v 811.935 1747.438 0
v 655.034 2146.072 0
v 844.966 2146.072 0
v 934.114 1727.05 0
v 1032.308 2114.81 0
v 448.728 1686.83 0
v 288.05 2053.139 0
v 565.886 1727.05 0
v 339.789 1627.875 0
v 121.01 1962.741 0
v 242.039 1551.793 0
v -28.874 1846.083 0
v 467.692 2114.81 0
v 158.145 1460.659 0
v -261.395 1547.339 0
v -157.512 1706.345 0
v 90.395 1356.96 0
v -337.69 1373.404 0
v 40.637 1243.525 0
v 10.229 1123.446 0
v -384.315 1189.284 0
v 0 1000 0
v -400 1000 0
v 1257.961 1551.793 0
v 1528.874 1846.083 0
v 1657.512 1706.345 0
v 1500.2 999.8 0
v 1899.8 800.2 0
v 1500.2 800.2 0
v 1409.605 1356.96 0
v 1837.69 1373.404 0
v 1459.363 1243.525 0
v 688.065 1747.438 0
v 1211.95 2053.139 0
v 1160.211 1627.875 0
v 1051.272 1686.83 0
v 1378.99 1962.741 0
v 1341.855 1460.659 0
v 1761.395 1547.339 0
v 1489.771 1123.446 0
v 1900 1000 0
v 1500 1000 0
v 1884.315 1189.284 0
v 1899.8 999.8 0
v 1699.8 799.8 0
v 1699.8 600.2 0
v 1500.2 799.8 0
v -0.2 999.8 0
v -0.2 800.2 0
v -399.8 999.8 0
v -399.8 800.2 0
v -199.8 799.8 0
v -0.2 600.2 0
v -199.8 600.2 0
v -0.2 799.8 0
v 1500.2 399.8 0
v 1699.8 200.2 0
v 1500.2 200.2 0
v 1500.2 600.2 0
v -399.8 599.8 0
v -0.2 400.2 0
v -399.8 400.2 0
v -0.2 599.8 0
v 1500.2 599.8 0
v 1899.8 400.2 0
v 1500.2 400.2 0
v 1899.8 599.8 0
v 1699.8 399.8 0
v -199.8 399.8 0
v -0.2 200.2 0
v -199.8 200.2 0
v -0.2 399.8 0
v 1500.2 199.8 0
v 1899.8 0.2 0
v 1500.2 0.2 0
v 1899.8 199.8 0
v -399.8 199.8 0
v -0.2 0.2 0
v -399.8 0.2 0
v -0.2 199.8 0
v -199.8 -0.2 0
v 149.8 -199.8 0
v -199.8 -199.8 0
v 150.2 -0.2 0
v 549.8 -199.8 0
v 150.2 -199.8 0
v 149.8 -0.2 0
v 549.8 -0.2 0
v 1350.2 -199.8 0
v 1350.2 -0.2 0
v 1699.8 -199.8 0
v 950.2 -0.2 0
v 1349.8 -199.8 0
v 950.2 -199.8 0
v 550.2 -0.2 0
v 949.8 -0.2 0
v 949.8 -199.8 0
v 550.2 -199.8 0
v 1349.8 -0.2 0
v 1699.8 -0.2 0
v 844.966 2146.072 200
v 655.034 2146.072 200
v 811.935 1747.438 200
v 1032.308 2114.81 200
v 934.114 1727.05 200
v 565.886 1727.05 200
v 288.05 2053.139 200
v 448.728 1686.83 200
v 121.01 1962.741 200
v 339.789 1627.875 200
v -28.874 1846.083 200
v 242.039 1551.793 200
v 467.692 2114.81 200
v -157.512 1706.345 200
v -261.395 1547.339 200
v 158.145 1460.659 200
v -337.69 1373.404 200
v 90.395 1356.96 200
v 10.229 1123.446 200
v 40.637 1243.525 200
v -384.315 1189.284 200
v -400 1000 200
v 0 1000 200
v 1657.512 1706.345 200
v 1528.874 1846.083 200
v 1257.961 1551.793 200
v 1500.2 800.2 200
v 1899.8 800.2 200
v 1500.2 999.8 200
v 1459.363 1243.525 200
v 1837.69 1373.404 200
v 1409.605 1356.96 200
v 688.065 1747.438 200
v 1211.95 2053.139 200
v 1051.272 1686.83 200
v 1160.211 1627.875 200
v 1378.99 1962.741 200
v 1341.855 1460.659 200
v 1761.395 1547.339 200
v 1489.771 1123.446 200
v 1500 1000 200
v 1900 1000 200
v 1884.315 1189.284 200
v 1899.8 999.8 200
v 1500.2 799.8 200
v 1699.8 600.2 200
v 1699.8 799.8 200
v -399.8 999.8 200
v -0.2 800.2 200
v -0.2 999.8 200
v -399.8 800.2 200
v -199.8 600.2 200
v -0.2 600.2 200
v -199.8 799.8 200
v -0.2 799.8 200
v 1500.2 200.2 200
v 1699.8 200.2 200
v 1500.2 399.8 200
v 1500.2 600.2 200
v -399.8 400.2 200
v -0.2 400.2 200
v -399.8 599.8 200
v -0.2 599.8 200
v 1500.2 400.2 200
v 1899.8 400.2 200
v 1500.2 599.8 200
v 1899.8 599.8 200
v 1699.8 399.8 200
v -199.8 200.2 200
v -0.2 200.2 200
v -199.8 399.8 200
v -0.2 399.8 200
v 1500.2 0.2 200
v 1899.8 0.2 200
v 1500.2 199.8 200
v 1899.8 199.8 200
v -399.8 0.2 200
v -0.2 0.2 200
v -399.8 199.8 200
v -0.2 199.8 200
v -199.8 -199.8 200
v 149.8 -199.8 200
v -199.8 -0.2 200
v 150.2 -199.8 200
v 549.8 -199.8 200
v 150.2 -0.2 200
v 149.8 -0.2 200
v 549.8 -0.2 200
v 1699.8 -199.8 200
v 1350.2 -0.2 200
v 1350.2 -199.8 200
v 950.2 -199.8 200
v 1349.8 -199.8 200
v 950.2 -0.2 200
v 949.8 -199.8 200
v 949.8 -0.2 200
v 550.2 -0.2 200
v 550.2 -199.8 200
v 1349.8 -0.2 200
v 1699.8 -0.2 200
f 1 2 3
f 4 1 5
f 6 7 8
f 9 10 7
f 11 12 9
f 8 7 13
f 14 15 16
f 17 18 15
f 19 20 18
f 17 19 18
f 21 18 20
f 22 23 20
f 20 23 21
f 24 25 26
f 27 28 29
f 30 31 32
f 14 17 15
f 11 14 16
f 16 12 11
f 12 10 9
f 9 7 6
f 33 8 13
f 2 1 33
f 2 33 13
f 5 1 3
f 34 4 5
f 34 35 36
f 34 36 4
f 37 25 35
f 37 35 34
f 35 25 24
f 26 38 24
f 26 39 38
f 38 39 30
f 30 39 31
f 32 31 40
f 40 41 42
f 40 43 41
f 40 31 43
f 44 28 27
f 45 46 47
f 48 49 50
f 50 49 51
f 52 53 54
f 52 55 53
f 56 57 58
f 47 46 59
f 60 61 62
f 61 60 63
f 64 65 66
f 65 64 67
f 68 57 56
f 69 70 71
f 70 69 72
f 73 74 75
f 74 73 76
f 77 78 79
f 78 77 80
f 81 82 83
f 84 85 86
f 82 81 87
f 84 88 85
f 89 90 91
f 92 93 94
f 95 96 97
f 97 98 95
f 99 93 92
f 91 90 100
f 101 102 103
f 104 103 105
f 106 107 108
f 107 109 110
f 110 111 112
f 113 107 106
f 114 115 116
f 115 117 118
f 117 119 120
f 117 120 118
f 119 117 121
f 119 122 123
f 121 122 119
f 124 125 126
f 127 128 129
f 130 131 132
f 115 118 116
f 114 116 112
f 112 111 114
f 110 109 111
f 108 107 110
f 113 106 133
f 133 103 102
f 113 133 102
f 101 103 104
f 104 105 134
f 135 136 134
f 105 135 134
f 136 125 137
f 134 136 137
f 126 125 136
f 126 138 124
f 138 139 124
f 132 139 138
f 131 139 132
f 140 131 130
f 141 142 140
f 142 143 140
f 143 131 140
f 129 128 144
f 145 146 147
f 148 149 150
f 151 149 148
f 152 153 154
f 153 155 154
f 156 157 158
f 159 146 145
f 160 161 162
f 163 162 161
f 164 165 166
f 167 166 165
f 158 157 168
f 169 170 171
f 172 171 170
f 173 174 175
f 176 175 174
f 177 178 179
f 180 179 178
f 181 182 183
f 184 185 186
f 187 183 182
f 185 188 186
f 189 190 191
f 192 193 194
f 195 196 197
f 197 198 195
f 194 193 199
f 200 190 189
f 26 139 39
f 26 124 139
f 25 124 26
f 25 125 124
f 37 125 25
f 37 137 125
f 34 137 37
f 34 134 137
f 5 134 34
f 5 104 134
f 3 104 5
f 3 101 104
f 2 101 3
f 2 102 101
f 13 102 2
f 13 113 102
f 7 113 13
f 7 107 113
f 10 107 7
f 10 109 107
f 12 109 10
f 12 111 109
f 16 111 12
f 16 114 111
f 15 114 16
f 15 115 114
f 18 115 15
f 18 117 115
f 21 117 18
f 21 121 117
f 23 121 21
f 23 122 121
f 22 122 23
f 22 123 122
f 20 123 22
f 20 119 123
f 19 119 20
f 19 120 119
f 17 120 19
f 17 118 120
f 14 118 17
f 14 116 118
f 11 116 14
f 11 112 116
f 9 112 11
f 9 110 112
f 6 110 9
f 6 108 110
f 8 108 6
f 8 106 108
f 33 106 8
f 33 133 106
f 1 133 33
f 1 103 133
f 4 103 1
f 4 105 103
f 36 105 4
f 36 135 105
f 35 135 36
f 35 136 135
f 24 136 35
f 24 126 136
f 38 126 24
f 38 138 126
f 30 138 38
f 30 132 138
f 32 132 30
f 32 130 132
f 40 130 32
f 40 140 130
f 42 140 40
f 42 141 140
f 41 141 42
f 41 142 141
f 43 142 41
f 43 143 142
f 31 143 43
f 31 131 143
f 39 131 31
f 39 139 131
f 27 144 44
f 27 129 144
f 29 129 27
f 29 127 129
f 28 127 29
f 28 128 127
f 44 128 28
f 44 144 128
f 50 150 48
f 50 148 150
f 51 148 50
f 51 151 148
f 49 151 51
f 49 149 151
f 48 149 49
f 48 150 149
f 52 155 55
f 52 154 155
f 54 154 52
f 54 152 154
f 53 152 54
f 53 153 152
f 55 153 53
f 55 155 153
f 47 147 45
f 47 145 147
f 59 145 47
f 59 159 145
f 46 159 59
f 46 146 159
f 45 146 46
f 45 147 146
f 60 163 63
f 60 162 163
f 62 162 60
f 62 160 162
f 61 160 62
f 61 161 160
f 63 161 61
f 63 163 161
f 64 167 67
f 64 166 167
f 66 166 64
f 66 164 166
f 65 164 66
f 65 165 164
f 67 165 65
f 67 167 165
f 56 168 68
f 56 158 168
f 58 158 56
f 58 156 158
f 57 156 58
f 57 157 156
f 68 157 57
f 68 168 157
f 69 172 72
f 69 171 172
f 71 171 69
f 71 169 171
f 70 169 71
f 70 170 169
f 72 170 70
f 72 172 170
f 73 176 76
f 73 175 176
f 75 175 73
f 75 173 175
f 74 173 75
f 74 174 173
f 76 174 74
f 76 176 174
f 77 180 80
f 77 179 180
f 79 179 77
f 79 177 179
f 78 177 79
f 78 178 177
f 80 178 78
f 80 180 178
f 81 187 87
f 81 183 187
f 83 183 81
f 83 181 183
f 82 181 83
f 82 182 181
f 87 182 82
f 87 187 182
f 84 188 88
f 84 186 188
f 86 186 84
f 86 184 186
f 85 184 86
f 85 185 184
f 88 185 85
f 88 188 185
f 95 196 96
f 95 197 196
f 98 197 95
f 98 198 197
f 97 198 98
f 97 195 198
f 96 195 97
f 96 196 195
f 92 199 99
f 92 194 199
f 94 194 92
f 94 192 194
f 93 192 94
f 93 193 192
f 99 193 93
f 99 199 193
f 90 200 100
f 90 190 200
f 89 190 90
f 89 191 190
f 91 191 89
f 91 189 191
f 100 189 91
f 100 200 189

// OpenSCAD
// Generated by Parametrix
ca_door1arc_faceDoor_000 = [ [ 1500.0000, 1000.0000 ],[ 1900.0000, 1000.0000 ],[ 1884.3155, 1189.2838 ],[ 1489.7710, 1123.4459 ],[ 1500.0000, 1000.0000 ] ];
cb_door1arc_faceDoor_000 = [  0, 1, 2, 3, 4 ];
ca_door1arc_faceDoor_001 = [ [ 1489.7710, 1123.4459 ],[ 1884.3155, 1189.2838 ],[ 1837.6898, 1373.4044 ],[ 1459.3629, 1243.5246 ],[ 1489.7710, 1123.4459 ] ];
cb_door1arc_faceDoor_001 = [  5, 6, 7, 8, 9 ];
ca_door1arc_faceDoor_002 = [ [ 1459.3629, 1243.5246 ],[ 1837.6898, 1373.4044 ],[ 1761.3948, 1547.3395 ],[ 1409.6053, 1356.9605 ],[ 1459.3629, 1243.5246 ] ];
cb_door1arc_faceDoor_002 = [  10, 11, 12, 13, 14 ];
ca_door1arc_faceDoor_003 = [ [ 1409.6053, 1356.9605 ],[ 1761.3948, 1547.3395 ],[ 1657.5116, 1706.3446 ],[ 1341.8554, 1460.6595 ],[ 1409.6053, 1356.9605 ] ];
cb_door1arc_faceDoor_003 = [  15, 16, 17, 18, 19 ];
ca_door1arc_faceDoor_004 = [ [ 1341.8554, 1460.6595 ],[ 1657.5116, 1706.3446 ],[ 1528.8738, 1846.0825 ],[ 1257.9612, 1551.7929 ],[ 1341.8554, 1460.6595 ] ];
cb_door1arc_faceDoor_004 = [  20, 21, 22, 23, 24 ];
ca_door1arc_faceDoor_005 = [ [ 1257.9612, 1551.7929 ],[ 1528.8738, 1846.0825 ],[ 1378.9904, 1962.7415 ],[ 1160.2111, 1627.8749 ],[ 1257.9612, 1551.7929 ] ];
cb_door1arc_faceDoor_005 = [  25, 26, 27, 28, 29 ];
ca_door1arc_faceDoor_006 = [ [ 1160.2111, 1627.8749 ],[ 1378.9904, 1962.7415 ],[ 1211.9497, 2053.1393 ],[ 1051.2716, 1686.8300 ],[ 1160.2111, 1627.8749 ] ];
cb_door1arc_faceDoor_006 = [  30, 31, 32, 33, 34 ];
ca_door1arc_faceDoor_007 = [ [ 1051.2716, 1686.8300 ],[ 1211.9497, 2053.1393 ],[ 1032.3083, 2114.8103 ],[ 934.1141, 1727.0502 ],[ 1051.2716, 1686.8300 ] ];
cb_door1arc_faceDoor_007 = [  35, 36, 37, 38, 39 ];
ca_door1arc_faceDoor_008 = [ [ 934.1141, 1727.0502 ],[ 1032.3083, 2114.8103 ],[ 844.9662, 2146.0722 ],[ 811.9345, 1747.4384 ],[ 934.1141, 1727.0502 ] ];
cb_door1arc_faceDoor_008 = [  40, 41, 42, 43, 44 ];
ca_door1arc_faceDoor_009 = [ [ 811.9345, 1747.4384 ],[ 844.9662, 2146.0722 ],[ 655.0338, 2146.0722 ],[ 688.0655, 1747.4384 ],[ 811.9345, 1747.4384 ] ];
cb_door1arc_faceDoor_009 = [  45, 46, 47, 48, 49 ];
ca_door1arc_faceDoor_010 = [ [ 688.0655, 1747.4384 ],[ 655.0338, 2146.0722 ],[ 467.6917, 2114.8103 ],[ 565.8859, 1727.0502 ],[ 688.0655, 1747.4384 ] ];
cb_door1arc_faceDoor_010 = [  50, 51, 52, 53, 54 ];
ca_door1arc_faceDoor_011 = [ [ 565.8859, 1727.0502 ],[ 467.6917, 2114.8103 ],[ 288.0503, 2053.1393 ],[ 448.7284, 1686.8300 ],[ 565.8859, 1727.0502 ] ];
cb_door1arc_faceDoor_011 = [  55, 56, 57, 58, 59 ];
ca_door1arc_faceDoor_012 = [ [ 448.7284, 1686.8300 ],[ 288.0503, 2053.1393 ],[ 121.0096, 1962.7415 ],[ 339.7889, 1627.8749 ],[ 448.7284, 1686.8300 ] ];
cb_door1arc_faceDoor_012 = [  60, 61, 62, 63, 64 ];
ca_door1arc_faceDoor_013 = [ [ 339.7889, 1627.8749 ],[ 121.0096, 1962.7415 ],[ -28.8738, 1846.0825 ],[ 242.0388, 1551.7929 ],[ 339.7889, 1627.8749 ] ];
cb_door1arc_faceDoor_013 = [  65, 66, 67, 68, 69 ];
ca_door1arc_faceDoor_014 = [ [ 242.0388, 1551.7929 ],[ -28.8738, 1846.0825 ],[ -157.5116, 1706.3446 ],[ 158.1446, 1460.6595 ],[ 242.0388, 1551.7929 ] ];
cb_door1arc_faceDoor_014 = [  70, 71, 72, 73, 74 ];
ca_door1arc_faceDoor_015 = [ [ 158.1446, 1460.6595 ],[ -157.5116, 1706.3446 ],[ -261.3948, 1547.3395 ],[ 90.3947, 1356.9605 ],[ 158.1446, 1460.6595 ] ];
cb_door1arc_faceDoor_015 = [  75, 76, 77, 78, 79 ];
ca_door1arc_faceDoor_016 = [ [ 90.3947, 1356.9605 ],[ -261.3948, 1547.3395 ],[ -337.6898, 1373.4044 ],[ 40.6371, 1243.5246 ],[ 90.3947, 1356.9605 ] ];
cb_door1arc_faceDoor_016 = [  80, 81, 82, 83, 84 ];
ca_door1arc_faceDoor_017 = [ [ 40.6371, 1243.5246 ],[ -337.6898, 1373.4044 ],[ -384.3155, 1189.2838 ],[ 10.2290, 1123.4459 ],[ 40.6371, 1243.5246 ] ];
cb_door1arc_faceDoor_017 = [  85, 86, 87, 88, 89 ];
ca_door1arc_faceDoor_018 = [ [ 10.2290, 1123.4459 ],[ -384.3155, 1189.2838 ],[ -400.0000, 1000.0000 ],[ 0.0000, 1000.0000 ],[ 10.2290, 1123.4459 ] ];
cb_door1arc_faceDoor_018 = [  90, 91, 92, 93, 94 ];
ca_door1arc_faceDoor_019 = [ [ -399.8000, 0.2000 ],[ -0.2000, 0.2000 ],[ -0.2000, 199.8000 ],[ -399.8000, 199.8000 ],[ -399.8000, 0.2000 ] ];
cb_door1arc_faceDoor_019 = [  95, 96, 97, 98, 99 ];
ca_door1arc_faceDoor_020 = [ [ 1500.2000, 0.2000 ],[ 1899.8000, 0.2000 ],[ 1899.8000, 199.8000 ],[ 1500.2000, 199.8000 ],[ 1500.2000, 0.2000 ] ];
cb_door1arc_faceDoor_020 = [  100, 101, 102, 103, 104 ];
ca_door1arc_faceDoor_021 = [ [ -199.8000, 200.2000 ],[ -0.2000, 200.2000 ],[ -0.2000, 399.8000 ],[ -199.8000, 399.8000 ],[ -199.8000, 200.2000 ] ];
cb_door1arc_faceDoor_021 = [  105, 106, 107, 108, 109 ];
ca_door1arc_faceDoor_022 = [ [ 1500.2000, 200.2000 ],[ 1699.8000, 200.2000 ],[ 1699.8000, 399.8000 ],[ 1500.2000, 399.8000 ],[ 1500.2000, 200.2000 ] ];
cb_door1arc_faceDoor_022 = [  110, 111, 112, 113, 114 ];
ca_door1arc_faceDoor_023 = [ [ -399.8000, 400.2000 ],[ -0.2000, 400.2000 ],[ -0.2000, 599.8000 ],[ -399.8000, 599.8000 ],[ -399.8000, 400.2000 ] ];
cb_door1arc_faceDoor_023 = [  115, 116, 117, 118, 119 ];
ca_door1arc_faceDoor_024 = [ [ 1500.2000, 400.2000 ],[ 1899.8000, 400.2000 ],[ 1899.8000, 599.8000 ],[ 1500.2000, 599.8000 ],[ 1500.2000, 400.2000 ] ];
cb_door1arc_faceDoor_024 = [  120, 121, 122, 123, 124 ];
ca_door1arc_faceDoor_025 = [ [ -199.8000, 600.2000 ],[ -0.2000, 600.2000 ],[ -0.2000, 799.8000 ],[ -199.8000, 799.8000 ],[ -199.8000, 600.2000 ] ];
cb_door1arc_faceDoor_025 = [  125, 126, 127, 128, 129 ];
ca_door1arc_faceDoor_026 = [ [ 1500.2000, 600.2000 ],[ 1699.8000, 600.2000 ],[ 1699.8000, 799.8000 ],[ 1500.2000, 799.8000 ],[ 1500.2000, 600.2000 ] ];
cb_door1arc_faceDoor_026 = [  130, 131, 132, 133, 134 ];
ca_door1arc_faceDoor_027 = [ [ -399.8000, 800.2000 ],[ -0.2000, 800.2000 ],[ -0.2000, 999.8000 ],[ -399.8000, 999.8000 ],[ -399.8000, 800.2000 ] ];
cb_door1arc_faceDoor_027 = [  135, 136, 137, 138, 139 ];
ca_door1arc_faceDoor_028 = [ [ 1500.2000, 800.2000 ],[ 1899.8000, 800.2000 ],[ 1899.8000, 999.8000 ],[ 1500.2000, 999.8000 ],[ 1500.2000, 800.2000 ] ];
cb_door1arc_faceDoor_028 = [  140, 141, 142, 143, 144 ];
ca_door1arc_faceDoor_029 = [ [ -199.8000, -199.8000 ],[ 149.8000, -199.8000 ],[ 149.8000, -0.2000 ],[ -199.8000, -0.2000 ],[ -199.8000, -199.8000 ] ];
cb_door1arc_faceDoor_029 = [  145, 146, 147, 148, 149 ];
ca_door1arc_faceDoor_030 = [ [ 150.2000, -199.8000 ],[ 549.8000, -199.8000 ],[ 549.8000, -0.2000 ],[ 150.2000, -0.2000 ],[ 150.2000, -199.8000 ] ];
cb_door1arc_faceDoor_030 = [  150, 151, 152, 153, 154 ];
ca_door1arc_faceDoor_031 = [ [ 550.2000, -199.8000 ],[ 949.8000, -199.8000 ],[ 949.8000, -0.2000 ],[ 550.2000, -0.2000 ],[ 550.2000, -199.8000 ] ];
cb_door1arc_faceDoor_031 = [  155, 156, 157, 158, 159 ];
ca_door1arc_faceDoor_032 = [ [ 950.2000, -199.8000 ],[ 1349.8000, -199.8000 ],[ 1349.8000, -0.2000 ],[ 950.2000, -0.2000 ],[ 950.2000, -199.8000 ] ];
cb_door1arc_faceDoor_032 = [  160, 161, 162, 163, 164 ];
ca_door1arc_faceDoor_033 = [ [ 1350.2000, -199.8000 ],[ 1699.8000, -199.8000 ],[ 1699.8000, -0.2000 ],[ 1350.2000, -0.2000 ],[ 1350.2000, -199.8000 ] ];
cb_door1arc_faceDoor_033 = [  165, 166, 167, 168, 169 ];
a_door1arc_faceDoor = concat(ca_door1arc_faceDoor_000, ca_door1arc_faceDoor_001, ca_door1arc_faceDoor_002, ca_door1arc_faceDoor_003, ca_door1arc_faceDoor_004, ca_door1arc_faceDoor_005, ca_door1arc_faceDoor_006, ca_door1arc_faceDoor_007, ca_door1arc_faceDoor_008, ca_door1arc_faceDoor_009, ca_door1arc_faceDoor_010, ca_door1arc_faceDoor_011, ca_door1arc_faceDoor_012, ca_door1arc_faceDoor_013, ca_door1arc_faceDoor_014, ca_door1arc_faceDoor_015, ca_door1arc_faceDoor_016, ca_door1arc_faceDoor_017, ca_door1arc_faceDoor_018, ca_door1arc_faceDoor_019, ca_door1arc_faceDoor_020, ca_door1arc_faceDoor_021, ca_door1arc_faceDoor_022, ca_door1arc_faceDoor_023, ca_door1arc_faceDoor_024, ca_door1arc_faceDoor_025, ca_door1arc_faceDoor_026, ca_door1arc_faceDoor_027, ca_door1arc_faceDoor_028, ca_door1arc_faceDoor_029, ca_door1arc_faceDoor_030, ca_door1arc_faceDoor_031, ca_door1arc_faceDoor_032, ca_door1arc_faceDoor_033);
b_door1arc_faceDoor = [cb_door1arc_faceDoor_000, cb_door1arc_faceDoor_001, cb_door1arc_faceDoor_002, cb_door1arc_faceDoor_003, cb_door1arc_faceDoor_004, cb_door1arc_faceDoor_005, cb_door1arc_faceDoor_006, cb_door1arc_faceDoor_007, cb_door1arc_faceDoor_008, cb_door1arc_faceDoor_009, cb_door1arc_faceDoor_010, cb_door1arc_faceDoor_011, cb_door1arc_faceDoor_012, cb_door1arc_faceDoor_013, cb_door1arc_faceDoor_014, cb_door1arc_faceDoor_015, cb_door1arc_faceDoor_016, cb_door1arc_faceDoor_017, cb_door1arc_faceDoor_018, cb_door1arc_faceDoor_019, cb_door1arc_faceDoor_020, cb_door1arc_faceDoor_021, cb_door1arc_faceDoor_022, cb_door1arc_faceDoor_023, cb_door1arc_faceDoor_024, cb_door1arc_faceDoor_025, cb_door1arc_faceDoor_026, cb_door1arc_faceDoor_027, cb_door1arc_faceDoor_028, cb_door1arc_faceDoor_029, cb_door1arc_faceDoor_030, cb_door1arc_faceDoor_031, cb_door1arc_faceDoor_032, cb_door1arc_faceDoor_033];

module subpax_door1arc_top () {
	translate( [ 0, 0, 0 ])
		rotate( [ 0, 0, 0 ])
			   linear_extrude(height = 200) polygon(a_door1arc_faceDoor, b_door1arc_faceDoor);
}

module pax_door1arc () {
	subpax_door1arc_top();
}

pax_door1arc();
